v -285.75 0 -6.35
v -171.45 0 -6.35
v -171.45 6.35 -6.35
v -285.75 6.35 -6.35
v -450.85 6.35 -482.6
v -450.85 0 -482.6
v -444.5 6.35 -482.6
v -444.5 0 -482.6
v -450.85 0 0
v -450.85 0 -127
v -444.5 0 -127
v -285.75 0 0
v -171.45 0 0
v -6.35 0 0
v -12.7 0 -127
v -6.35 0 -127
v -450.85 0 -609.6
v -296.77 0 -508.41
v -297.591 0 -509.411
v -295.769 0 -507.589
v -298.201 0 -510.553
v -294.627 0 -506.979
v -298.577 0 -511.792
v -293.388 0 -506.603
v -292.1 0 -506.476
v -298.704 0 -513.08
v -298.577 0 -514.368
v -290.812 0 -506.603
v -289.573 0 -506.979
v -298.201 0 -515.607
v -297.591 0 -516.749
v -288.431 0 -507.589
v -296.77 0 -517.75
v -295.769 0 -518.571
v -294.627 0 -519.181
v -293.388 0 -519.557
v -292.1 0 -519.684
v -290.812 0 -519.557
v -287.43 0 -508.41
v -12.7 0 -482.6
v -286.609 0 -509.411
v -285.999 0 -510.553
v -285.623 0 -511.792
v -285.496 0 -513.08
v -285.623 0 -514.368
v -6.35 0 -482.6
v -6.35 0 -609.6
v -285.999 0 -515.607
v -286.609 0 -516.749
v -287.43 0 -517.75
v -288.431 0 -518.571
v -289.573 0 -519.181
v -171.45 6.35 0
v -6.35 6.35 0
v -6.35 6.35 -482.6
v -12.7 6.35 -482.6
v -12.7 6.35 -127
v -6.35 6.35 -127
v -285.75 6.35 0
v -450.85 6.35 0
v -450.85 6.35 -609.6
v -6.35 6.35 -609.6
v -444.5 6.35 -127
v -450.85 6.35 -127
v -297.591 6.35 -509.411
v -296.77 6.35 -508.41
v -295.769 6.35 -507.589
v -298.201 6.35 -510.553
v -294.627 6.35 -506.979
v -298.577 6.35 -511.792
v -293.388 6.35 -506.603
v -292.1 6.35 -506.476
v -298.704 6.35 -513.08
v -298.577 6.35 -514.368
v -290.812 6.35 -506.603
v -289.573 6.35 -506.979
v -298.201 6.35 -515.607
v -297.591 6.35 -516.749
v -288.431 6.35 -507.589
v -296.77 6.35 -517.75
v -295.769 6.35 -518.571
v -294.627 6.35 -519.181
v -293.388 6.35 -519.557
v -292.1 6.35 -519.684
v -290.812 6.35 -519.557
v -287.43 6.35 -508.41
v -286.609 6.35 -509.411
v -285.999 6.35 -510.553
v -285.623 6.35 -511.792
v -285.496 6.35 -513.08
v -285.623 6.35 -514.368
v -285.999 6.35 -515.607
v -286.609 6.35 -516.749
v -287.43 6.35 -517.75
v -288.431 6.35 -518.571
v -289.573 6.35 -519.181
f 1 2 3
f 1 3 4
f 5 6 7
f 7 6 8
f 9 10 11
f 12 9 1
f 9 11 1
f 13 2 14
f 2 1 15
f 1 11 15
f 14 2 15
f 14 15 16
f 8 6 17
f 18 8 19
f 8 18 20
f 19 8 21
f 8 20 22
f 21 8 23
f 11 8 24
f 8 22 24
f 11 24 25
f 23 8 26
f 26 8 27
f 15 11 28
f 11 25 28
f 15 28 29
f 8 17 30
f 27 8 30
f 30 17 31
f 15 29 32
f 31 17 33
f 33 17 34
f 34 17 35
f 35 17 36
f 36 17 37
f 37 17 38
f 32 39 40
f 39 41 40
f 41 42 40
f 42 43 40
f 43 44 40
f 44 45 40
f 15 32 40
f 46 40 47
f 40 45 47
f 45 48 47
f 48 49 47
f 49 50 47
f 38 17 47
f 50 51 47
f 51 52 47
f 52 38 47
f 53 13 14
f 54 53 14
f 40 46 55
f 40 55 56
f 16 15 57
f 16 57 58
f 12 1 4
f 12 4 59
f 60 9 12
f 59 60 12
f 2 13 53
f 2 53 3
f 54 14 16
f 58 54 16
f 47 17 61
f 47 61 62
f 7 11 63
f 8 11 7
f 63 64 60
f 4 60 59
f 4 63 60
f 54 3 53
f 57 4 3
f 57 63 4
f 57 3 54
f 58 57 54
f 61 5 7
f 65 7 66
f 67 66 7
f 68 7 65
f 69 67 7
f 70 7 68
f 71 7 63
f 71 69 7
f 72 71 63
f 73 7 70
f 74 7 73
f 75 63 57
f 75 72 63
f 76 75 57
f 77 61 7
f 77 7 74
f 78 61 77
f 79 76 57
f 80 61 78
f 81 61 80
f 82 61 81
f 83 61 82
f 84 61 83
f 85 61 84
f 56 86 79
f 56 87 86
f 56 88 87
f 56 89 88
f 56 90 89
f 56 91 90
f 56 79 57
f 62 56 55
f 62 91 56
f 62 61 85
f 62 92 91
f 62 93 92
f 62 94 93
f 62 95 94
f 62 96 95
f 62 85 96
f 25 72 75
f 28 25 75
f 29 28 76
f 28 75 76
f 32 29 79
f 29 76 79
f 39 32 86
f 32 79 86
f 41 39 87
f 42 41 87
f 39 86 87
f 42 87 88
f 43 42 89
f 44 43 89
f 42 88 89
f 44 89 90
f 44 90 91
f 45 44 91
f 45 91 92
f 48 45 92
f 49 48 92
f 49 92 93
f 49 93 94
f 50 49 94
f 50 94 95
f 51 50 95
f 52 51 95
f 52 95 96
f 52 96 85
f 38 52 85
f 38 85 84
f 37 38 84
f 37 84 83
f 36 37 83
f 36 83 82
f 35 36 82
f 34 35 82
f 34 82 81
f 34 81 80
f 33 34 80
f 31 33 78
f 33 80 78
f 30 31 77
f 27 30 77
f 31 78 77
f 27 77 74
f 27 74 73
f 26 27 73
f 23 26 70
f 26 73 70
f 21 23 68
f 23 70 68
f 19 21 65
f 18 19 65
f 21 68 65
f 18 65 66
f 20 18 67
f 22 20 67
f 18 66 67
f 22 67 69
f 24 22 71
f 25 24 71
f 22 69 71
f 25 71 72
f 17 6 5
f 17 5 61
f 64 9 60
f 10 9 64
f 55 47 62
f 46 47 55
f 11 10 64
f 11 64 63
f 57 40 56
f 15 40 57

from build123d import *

# Parameters (mm, degrees)
SKETCH1_W                = 457.2
SKETCH1_H                = 609.6
BOSS_EXTRUDE1_DEPTH      = 6.35
CUT_EXTRUDE4_DEPTH       = 763.026457874
CUT_EXTRUDE4_DEPTH_BACK  = 763.026457874
SKETCH3_W                = 12.7
SKETCH3_H                = 355.6
CUT_EXTRUDE5_DEPTH       = 763.026457874
CUT_EXTRUDE5_DEPTH_BACK  = 763.026457874
CUT_EXTRUDE7_DEPTH       = 763.026457874
CUT_EXTRUDE7_DEPTH_BACK  = 763.026457874
SKETCH7_W                = 6.35
SKETCH7_H                = 127
CUT_EXTRUDE8_DEPTH       = 763.026457874
CUT_EXTRUDE8_DEPTH_BACK  = 763.026457874
CUT_EXTRUDE10_START      = -6.35
CUT_EXTRUDE10_OUTLINE_W  = 6.35
CUT_EXTRUDE10_OUTLINE_H  = 127
CUT_EXTRUDE10_DEPTH      = 6.35
CUT_EXTRUDE11_DEPTH      = 763.026457874
CUT_EXTRUDE11_DEPTH_BACK = 763.026457874
CUT_EXTRUDE12_DEPTH      = 759.233608461
CUT_EXTRUDE12_DEPTH_BACK = 759.233608461
SKETCH2_R                = 6.604
CUT_EXTRUDE13_DEPTH      = 759.233608461


# Read off the part's stored shape, not the designer's step: Cut-Extrude10
with BuildPart() as part:
    # Sketch1 → Boss-Extrude1 (new body)
    with BuildSketch(Plane(origin=(0, 0, 0), x_dir=(1, 0, 0), z_dir=(0, 1, 0))):
        with Locations((-228.6, 304.8)):
            Rectangle(SKETCH1_W, SKETCH1_H)
    extrude(amount=BOSS_EXTRUDE1_DEPTH)

    # Sketch3 → Cut-Extrude4 (cut, two sides: drawn at the far end of the back side and taken through both)
    with BuildSketch(Plane(origin=(0, 6.35, 0), x_dir=(1, 0, 0), z_dir=(0, 1, 0)).offset(-CUT_EXTRUDE4_DEPTH_BACK)):
        with Locations((-450.85, 304.8)):
            Rectangle(SKETCH3_W, SKETCH3_H)
    extrude(amount=CUT_EXTRUDE4_DEPTH + CUT_EXTRUDE4_DEPTH_BACK, mode=Mode.SUBTRACT)

    # Sketch5 → Cut-Extrude5 (cut, two sides: drawn at the far end of the back side and taken through both)
    with BuildSketch(Plane(origin=(0, 6.35, 0), x_dir=(1, 0, 0), z_dir=(0, 1, 0)).offset(-CUT_EXTRUDE5_DEPTH_BACK)):
        Polygon((1339.563236556, 482.6), (0, 482.6), (-12.7, 482.6), (-12.7, 127), (0, 127), (1339.563236556, 127), (4018.689709667, 127), (4018.689709667, 482.6), align=None)
    extrude(amount=CUT_EXTRUDE5_DEPTH + CUT_EXTRUDE5_DEPTH_BACK, mode=Mode.SUBTRACT)

    # Sketch7 → Cut-Extrude7 (cut, two sides: drawn at the far end of the back side and taken through both)
    with BuildSketch(Plane(origin=(0, 6.35, 0), x_dir=(1, 0, 0), z_dir=(0, 1, 0)).offset(-CUT_EXTRUDE7_DEPTH_BACK)):
        with Locations((-3.175, 63.5)):
            Rectangle(SKETCH7_W, SKETCH7_H)
    extrude(amount=CUT_EXTRUDE7_DEPTH + CUT_EXTRUDE7_DEPTH_BACK, mode=Mode.SUBTRACT)

    # Sketch8 → Cut-Extrude8 (cut, two sides: drawn at the far end of the back side and taken through both)
    with BuildSketch(Plane(origin=(0, 6.35, 0), x_dir=(1, 0, 0), z_dir=(0, 1, 0)).offset(-CUT_EXTRUDE8_DEPTH_BACK)):
        Polygon((-6.35, 2136.014036469), (-6.35, 609.6), (-6.35, 482.6), (-6.35, -1043.814036469), (3046.478072938, -1043.814036469), (3046.478072938, 2136.014036469), align=None)
    extrude(amount=CUT_EXTRUDE8_DEPTH + CUT_EXTRUDE8_DEPTH_BACK, mode=Mode.SUBTRACT)

    # Cut-Extrude10 outline → Cut-Extrude10 (cut)
    with BuildSketch(Plane(origin=(0, 6.35, 0), x_dir=(1, 0, 0), z_dir=(0, 1, 0)).offset(CUT_EXTRUDE10_START)):
        with Locations((-454.025, 546.1)):
            Rectangle(CUT_EXTRUDE10_OUTLINE_W, CUT_EXTRUDE10_OUTLINE_H)
    extrude(amount=CUT_EXTRUDE10_DEPTH, mode=Mode.SUBTRACT)

    # Sketch11 → Cut-Extrude11 (cut, two sides: drawn at the far end of the back side and taken through both)
    with BuildSketch(Plane(origin=(0, 6.35, 0), x_dir=(1, 0, 0), z_dir=(0, 1, 0)).offset(-CUT_EXTRUDE11_DEPTH_BACK)):
        Polygon((-450.85, 1645.896828812), (-450.85, 127), (-450.85, 0), (-450.85, -1518.896828812), (-3488.643657625, -1518.896828812), (-3488.643657625, 1645.896828812), align=None)
    extrude(amount=CUT_EXTRUDE11_DEPTH + CUT_EXTRUDE11_DEPTH_BACK, mode=Mode.SUBTRACT)

    # Sketch6 → Cut-Extrude12 (cut, two sides: drawn at the far end of the back side and taken through both)
    with BuildSketch(Plane(origin=(0, 6.35, 0), x_dir=(1, 0, 0), z_dir=(0, 1, 0)).offset(-CUT_EXTRUDE12_DEPTH_BACK)):
        Polygon((-171.45, -1351.158484296), (-171.45, 0), (-171.45, 6.35), (-285.75, 6.35), (-285.75, 0), (-285.75, -1351.158484296), (-285.75, -4053.475452889), (-171.45, -4053.475452889), align=None)
    extrude(amount=CUT_EXTRUDE12_DEPTH + CUT_EXTRUDE12_DEPTH_BACK, mode=Mode.SUBTRACT)

    # Sketch2 → Cut-Extrude13 (cut, through all)
    with BuildSketch(Plane(origin=(0, 6.35, 0), x_dir=(1, 0, 0), z_dir=(0, 1, 0))):
        with Locations(Location((-292.1, 513.08, 0), (0, 0, 270))):
            Circle(SKETCH2_R)
    extrude(amount=-CUT_EXTRUDE13_DEPTH, mode=Mode.SUBTRACT)


solid = part.part
